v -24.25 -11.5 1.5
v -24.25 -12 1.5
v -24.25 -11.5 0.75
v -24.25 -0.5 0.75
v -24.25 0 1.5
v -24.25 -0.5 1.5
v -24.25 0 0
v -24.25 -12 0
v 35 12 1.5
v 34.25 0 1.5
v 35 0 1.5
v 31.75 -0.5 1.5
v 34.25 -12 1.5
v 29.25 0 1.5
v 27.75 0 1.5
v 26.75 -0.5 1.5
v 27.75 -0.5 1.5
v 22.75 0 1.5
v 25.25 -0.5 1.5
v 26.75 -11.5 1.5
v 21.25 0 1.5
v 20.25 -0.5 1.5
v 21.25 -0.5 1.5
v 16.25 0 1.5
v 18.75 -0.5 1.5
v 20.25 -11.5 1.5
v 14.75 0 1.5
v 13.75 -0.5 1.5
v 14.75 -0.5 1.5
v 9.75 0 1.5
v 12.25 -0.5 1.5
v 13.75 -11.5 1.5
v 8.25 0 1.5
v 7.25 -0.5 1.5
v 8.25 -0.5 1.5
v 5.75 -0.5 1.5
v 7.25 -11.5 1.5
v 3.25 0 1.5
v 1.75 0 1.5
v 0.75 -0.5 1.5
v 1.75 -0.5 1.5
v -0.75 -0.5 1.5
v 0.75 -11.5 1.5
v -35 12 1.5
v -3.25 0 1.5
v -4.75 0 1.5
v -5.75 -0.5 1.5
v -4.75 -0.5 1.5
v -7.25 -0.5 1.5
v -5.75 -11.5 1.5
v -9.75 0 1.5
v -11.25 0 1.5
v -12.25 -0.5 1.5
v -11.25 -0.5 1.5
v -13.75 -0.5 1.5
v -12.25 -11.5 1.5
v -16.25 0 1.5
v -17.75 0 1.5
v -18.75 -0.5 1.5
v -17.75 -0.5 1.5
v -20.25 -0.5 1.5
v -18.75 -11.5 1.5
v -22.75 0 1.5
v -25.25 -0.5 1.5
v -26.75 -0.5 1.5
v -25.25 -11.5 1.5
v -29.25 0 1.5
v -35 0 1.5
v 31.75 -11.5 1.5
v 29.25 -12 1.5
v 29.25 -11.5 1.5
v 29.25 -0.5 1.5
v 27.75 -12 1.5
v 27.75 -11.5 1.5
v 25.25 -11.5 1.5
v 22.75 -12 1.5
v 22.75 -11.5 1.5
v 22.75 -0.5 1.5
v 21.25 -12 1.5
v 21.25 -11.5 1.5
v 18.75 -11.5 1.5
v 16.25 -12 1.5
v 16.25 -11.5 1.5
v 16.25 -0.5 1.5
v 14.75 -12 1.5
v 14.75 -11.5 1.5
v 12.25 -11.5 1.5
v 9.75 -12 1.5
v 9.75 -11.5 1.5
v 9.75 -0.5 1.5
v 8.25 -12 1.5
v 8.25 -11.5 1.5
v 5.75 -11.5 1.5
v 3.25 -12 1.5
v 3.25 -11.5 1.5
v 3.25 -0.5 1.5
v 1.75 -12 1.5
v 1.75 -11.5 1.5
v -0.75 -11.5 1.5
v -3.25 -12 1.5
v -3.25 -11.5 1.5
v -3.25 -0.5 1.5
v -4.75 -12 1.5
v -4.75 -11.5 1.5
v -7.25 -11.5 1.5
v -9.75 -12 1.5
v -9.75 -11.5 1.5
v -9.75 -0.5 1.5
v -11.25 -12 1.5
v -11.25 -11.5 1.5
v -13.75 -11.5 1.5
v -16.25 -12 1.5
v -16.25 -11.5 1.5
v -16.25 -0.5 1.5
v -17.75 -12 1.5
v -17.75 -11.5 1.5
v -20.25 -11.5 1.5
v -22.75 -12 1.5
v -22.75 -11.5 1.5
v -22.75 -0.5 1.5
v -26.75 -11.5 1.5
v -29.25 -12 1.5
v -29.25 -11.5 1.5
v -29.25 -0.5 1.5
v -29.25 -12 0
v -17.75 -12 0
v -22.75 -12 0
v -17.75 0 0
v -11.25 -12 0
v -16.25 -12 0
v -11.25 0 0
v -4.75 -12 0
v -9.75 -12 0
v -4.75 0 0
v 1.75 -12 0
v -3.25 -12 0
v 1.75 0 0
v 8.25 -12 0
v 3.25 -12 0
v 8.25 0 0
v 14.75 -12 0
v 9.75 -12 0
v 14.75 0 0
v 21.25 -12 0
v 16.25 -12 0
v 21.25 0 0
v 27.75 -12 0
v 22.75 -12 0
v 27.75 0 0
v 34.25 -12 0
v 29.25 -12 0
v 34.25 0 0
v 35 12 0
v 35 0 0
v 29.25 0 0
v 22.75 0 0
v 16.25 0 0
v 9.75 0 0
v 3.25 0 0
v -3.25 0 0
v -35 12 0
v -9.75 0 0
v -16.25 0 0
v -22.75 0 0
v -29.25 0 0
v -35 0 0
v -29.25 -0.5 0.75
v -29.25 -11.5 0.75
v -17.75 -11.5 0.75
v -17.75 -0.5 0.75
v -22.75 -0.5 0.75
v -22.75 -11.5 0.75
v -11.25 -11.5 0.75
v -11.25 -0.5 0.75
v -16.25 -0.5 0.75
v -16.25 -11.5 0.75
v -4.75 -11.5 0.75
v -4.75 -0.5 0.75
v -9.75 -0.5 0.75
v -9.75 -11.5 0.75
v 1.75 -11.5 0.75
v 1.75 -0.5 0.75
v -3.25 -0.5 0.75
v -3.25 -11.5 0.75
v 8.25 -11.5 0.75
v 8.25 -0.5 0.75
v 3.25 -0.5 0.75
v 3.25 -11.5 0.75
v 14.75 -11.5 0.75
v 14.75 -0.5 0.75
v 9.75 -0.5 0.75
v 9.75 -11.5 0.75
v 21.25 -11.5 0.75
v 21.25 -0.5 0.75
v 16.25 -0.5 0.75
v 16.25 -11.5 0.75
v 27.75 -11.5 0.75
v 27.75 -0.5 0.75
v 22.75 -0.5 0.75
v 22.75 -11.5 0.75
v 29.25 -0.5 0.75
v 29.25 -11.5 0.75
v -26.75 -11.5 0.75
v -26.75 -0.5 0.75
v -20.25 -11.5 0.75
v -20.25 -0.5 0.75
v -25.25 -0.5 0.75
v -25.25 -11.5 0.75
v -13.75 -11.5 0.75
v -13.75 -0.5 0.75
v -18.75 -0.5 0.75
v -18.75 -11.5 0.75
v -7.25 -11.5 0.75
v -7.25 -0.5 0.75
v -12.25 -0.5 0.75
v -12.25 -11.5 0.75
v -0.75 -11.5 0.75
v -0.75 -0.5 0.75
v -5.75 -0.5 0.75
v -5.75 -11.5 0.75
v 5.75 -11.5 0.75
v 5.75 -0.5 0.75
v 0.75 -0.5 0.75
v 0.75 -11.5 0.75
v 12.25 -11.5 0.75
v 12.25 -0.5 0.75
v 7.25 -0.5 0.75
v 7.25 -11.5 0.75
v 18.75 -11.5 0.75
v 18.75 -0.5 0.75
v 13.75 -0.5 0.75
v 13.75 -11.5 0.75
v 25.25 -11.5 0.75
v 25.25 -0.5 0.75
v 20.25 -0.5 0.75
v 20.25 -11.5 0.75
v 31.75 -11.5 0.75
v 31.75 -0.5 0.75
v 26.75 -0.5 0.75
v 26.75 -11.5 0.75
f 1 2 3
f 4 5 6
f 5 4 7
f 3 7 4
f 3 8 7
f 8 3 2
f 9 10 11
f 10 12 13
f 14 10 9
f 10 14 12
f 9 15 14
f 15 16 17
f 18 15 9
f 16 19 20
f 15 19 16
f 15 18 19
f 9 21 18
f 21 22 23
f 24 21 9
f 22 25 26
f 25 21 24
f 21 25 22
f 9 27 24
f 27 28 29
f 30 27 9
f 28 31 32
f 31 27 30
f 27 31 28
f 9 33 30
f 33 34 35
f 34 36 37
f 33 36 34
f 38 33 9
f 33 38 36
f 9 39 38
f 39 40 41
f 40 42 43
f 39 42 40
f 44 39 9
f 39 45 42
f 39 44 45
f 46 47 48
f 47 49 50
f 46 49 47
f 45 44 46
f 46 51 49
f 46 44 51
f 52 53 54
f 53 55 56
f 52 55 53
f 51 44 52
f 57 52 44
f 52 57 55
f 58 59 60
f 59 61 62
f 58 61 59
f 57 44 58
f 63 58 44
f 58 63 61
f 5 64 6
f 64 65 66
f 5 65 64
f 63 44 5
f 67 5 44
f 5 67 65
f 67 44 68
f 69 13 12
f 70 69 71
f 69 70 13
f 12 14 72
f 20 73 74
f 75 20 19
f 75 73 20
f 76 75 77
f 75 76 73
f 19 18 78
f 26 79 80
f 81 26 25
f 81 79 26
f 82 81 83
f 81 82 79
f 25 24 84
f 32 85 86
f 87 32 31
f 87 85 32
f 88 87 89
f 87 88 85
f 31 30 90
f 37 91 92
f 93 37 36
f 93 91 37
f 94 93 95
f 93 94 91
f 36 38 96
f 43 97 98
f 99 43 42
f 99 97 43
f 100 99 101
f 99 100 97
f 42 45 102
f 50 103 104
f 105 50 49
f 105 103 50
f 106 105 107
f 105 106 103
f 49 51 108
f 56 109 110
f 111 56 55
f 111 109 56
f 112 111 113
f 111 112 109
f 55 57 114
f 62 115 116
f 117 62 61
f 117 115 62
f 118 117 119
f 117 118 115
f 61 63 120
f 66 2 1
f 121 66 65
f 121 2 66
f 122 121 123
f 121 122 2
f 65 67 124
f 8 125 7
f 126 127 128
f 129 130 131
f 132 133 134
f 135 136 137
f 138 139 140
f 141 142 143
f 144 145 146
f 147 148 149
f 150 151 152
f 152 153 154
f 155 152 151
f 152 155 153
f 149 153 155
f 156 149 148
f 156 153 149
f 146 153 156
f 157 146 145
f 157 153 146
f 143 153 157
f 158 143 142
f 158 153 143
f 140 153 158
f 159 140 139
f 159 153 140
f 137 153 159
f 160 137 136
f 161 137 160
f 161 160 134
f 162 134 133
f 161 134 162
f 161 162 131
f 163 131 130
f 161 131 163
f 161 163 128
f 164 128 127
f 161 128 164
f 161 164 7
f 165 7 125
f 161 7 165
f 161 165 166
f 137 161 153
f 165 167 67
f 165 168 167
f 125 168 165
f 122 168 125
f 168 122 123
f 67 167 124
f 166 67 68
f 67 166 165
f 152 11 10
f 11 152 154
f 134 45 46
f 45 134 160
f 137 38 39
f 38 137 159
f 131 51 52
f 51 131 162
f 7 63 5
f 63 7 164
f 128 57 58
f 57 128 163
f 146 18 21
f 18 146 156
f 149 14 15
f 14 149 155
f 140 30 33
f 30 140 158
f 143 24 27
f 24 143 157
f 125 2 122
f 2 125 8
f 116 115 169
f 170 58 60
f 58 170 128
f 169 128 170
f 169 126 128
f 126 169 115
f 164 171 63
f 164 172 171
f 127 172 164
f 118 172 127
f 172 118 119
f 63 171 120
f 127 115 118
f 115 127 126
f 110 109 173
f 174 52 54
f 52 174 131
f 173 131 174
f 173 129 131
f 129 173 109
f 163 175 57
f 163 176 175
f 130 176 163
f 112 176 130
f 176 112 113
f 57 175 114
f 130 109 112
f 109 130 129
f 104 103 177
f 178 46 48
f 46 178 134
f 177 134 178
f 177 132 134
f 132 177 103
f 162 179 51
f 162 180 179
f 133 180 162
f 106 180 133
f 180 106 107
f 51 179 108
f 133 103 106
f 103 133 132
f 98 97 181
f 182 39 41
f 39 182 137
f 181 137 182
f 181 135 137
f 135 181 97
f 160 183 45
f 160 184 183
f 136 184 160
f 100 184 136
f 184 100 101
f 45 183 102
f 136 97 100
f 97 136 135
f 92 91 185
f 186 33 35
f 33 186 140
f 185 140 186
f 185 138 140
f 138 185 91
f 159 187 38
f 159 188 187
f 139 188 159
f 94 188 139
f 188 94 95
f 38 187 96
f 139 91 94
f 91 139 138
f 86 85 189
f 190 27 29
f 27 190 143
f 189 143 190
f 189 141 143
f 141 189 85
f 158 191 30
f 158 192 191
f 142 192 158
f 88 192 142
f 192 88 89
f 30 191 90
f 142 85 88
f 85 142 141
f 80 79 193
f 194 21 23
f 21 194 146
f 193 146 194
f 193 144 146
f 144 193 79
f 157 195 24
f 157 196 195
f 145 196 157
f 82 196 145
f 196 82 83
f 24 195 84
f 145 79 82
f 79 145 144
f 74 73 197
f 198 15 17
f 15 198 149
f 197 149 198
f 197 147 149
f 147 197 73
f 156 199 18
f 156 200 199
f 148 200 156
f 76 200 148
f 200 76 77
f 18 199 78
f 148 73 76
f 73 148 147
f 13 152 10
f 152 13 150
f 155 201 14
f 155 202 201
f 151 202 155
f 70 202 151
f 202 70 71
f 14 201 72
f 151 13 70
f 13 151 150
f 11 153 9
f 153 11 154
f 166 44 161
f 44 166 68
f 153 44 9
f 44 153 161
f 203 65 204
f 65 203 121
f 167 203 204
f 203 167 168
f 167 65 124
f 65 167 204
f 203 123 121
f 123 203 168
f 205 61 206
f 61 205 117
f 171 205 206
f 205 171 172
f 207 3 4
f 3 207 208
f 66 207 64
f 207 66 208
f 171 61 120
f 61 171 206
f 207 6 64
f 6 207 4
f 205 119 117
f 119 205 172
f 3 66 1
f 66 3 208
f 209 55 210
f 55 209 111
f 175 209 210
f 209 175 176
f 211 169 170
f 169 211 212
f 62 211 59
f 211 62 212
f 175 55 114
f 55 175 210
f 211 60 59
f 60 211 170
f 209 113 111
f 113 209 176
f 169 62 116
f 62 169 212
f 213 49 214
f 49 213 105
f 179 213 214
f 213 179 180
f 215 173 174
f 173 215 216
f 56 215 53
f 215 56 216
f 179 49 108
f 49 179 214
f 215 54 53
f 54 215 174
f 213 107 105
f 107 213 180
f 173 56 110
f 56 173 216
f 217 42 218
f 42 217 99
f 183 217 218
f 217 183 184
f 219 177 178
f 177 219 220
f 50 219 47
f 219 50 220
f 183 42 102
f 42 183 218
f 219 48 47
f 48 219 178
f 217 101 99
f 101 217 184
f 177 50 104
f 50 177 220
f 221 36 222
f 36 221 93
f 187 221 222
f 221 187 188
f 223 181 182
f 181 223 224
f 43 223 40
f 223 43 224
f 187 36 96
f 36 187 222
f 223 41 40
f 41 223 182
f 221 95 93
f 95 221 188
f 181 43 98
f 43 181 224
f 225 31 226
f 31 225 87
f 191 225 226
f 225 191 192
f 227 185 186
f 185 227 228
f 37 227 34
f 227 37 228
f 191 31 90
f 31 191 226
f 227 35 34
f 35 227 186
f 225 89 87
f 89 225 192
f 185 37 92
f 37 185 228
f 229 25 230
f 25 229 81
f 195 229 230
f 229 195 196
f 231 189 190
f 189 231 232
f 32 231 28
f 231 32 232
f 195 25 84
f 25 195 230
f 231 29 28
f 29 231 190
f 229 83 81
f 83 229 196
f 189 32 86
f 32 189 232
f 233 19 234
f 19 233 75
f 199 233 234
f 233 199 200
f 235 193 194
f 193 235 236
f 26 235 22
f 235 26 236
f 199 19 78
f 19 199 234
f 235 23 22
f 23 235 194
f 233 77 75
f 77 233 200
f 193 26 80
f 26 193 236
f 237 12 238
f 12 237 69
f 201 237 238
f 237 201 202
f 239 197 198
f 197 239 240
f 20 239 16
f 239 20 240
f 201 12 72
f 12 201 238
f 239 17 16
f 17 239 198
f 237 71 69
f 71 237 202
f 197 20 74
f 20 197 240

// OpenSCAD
// 10-well agarose gel comb, printed lying flat
// Units: mm

plate_t      = 1.5;   // plate thickness (Z)
spine_len    = 70;    // spine length (X)
spine_w      = 12;    // spine width (Y)
tooth_count  = 10;    // number of teeth
tooth_w      = 5.0;   // tooth width (X)
tooth_len    = 12;    // tooth length (Y)
gap          = 1.5;   // gap between teeth (X)
eps          = 0.5;   // cutter overshoot

$fn = 64;

pitch = tooth_w + gap;
x0    = -(tooth_count - 1) * pitch / 2;    // first tooth left edge

difference() {
    union() {
        // spine
        translate([-spine_len / 2, 0, 0])
            cube([spine_len, spine_w, plate_t]);
        // teeth
        for (i = [0 : tooth_count - 1])
            translate([x0 + i * pitch, -tooth_len, 0])
                cube([tooth_w, tooth_len, plate_t]);
    }
    // wells
    for (i = [0 : tooth_count - 1])
        translate([x0 + i * pitch - tooth_w / 2, -tooth_len + eps, plate_t / 2])
            cube([tooth_w, tooth_len - 2 * eps, plate_t]);
}
